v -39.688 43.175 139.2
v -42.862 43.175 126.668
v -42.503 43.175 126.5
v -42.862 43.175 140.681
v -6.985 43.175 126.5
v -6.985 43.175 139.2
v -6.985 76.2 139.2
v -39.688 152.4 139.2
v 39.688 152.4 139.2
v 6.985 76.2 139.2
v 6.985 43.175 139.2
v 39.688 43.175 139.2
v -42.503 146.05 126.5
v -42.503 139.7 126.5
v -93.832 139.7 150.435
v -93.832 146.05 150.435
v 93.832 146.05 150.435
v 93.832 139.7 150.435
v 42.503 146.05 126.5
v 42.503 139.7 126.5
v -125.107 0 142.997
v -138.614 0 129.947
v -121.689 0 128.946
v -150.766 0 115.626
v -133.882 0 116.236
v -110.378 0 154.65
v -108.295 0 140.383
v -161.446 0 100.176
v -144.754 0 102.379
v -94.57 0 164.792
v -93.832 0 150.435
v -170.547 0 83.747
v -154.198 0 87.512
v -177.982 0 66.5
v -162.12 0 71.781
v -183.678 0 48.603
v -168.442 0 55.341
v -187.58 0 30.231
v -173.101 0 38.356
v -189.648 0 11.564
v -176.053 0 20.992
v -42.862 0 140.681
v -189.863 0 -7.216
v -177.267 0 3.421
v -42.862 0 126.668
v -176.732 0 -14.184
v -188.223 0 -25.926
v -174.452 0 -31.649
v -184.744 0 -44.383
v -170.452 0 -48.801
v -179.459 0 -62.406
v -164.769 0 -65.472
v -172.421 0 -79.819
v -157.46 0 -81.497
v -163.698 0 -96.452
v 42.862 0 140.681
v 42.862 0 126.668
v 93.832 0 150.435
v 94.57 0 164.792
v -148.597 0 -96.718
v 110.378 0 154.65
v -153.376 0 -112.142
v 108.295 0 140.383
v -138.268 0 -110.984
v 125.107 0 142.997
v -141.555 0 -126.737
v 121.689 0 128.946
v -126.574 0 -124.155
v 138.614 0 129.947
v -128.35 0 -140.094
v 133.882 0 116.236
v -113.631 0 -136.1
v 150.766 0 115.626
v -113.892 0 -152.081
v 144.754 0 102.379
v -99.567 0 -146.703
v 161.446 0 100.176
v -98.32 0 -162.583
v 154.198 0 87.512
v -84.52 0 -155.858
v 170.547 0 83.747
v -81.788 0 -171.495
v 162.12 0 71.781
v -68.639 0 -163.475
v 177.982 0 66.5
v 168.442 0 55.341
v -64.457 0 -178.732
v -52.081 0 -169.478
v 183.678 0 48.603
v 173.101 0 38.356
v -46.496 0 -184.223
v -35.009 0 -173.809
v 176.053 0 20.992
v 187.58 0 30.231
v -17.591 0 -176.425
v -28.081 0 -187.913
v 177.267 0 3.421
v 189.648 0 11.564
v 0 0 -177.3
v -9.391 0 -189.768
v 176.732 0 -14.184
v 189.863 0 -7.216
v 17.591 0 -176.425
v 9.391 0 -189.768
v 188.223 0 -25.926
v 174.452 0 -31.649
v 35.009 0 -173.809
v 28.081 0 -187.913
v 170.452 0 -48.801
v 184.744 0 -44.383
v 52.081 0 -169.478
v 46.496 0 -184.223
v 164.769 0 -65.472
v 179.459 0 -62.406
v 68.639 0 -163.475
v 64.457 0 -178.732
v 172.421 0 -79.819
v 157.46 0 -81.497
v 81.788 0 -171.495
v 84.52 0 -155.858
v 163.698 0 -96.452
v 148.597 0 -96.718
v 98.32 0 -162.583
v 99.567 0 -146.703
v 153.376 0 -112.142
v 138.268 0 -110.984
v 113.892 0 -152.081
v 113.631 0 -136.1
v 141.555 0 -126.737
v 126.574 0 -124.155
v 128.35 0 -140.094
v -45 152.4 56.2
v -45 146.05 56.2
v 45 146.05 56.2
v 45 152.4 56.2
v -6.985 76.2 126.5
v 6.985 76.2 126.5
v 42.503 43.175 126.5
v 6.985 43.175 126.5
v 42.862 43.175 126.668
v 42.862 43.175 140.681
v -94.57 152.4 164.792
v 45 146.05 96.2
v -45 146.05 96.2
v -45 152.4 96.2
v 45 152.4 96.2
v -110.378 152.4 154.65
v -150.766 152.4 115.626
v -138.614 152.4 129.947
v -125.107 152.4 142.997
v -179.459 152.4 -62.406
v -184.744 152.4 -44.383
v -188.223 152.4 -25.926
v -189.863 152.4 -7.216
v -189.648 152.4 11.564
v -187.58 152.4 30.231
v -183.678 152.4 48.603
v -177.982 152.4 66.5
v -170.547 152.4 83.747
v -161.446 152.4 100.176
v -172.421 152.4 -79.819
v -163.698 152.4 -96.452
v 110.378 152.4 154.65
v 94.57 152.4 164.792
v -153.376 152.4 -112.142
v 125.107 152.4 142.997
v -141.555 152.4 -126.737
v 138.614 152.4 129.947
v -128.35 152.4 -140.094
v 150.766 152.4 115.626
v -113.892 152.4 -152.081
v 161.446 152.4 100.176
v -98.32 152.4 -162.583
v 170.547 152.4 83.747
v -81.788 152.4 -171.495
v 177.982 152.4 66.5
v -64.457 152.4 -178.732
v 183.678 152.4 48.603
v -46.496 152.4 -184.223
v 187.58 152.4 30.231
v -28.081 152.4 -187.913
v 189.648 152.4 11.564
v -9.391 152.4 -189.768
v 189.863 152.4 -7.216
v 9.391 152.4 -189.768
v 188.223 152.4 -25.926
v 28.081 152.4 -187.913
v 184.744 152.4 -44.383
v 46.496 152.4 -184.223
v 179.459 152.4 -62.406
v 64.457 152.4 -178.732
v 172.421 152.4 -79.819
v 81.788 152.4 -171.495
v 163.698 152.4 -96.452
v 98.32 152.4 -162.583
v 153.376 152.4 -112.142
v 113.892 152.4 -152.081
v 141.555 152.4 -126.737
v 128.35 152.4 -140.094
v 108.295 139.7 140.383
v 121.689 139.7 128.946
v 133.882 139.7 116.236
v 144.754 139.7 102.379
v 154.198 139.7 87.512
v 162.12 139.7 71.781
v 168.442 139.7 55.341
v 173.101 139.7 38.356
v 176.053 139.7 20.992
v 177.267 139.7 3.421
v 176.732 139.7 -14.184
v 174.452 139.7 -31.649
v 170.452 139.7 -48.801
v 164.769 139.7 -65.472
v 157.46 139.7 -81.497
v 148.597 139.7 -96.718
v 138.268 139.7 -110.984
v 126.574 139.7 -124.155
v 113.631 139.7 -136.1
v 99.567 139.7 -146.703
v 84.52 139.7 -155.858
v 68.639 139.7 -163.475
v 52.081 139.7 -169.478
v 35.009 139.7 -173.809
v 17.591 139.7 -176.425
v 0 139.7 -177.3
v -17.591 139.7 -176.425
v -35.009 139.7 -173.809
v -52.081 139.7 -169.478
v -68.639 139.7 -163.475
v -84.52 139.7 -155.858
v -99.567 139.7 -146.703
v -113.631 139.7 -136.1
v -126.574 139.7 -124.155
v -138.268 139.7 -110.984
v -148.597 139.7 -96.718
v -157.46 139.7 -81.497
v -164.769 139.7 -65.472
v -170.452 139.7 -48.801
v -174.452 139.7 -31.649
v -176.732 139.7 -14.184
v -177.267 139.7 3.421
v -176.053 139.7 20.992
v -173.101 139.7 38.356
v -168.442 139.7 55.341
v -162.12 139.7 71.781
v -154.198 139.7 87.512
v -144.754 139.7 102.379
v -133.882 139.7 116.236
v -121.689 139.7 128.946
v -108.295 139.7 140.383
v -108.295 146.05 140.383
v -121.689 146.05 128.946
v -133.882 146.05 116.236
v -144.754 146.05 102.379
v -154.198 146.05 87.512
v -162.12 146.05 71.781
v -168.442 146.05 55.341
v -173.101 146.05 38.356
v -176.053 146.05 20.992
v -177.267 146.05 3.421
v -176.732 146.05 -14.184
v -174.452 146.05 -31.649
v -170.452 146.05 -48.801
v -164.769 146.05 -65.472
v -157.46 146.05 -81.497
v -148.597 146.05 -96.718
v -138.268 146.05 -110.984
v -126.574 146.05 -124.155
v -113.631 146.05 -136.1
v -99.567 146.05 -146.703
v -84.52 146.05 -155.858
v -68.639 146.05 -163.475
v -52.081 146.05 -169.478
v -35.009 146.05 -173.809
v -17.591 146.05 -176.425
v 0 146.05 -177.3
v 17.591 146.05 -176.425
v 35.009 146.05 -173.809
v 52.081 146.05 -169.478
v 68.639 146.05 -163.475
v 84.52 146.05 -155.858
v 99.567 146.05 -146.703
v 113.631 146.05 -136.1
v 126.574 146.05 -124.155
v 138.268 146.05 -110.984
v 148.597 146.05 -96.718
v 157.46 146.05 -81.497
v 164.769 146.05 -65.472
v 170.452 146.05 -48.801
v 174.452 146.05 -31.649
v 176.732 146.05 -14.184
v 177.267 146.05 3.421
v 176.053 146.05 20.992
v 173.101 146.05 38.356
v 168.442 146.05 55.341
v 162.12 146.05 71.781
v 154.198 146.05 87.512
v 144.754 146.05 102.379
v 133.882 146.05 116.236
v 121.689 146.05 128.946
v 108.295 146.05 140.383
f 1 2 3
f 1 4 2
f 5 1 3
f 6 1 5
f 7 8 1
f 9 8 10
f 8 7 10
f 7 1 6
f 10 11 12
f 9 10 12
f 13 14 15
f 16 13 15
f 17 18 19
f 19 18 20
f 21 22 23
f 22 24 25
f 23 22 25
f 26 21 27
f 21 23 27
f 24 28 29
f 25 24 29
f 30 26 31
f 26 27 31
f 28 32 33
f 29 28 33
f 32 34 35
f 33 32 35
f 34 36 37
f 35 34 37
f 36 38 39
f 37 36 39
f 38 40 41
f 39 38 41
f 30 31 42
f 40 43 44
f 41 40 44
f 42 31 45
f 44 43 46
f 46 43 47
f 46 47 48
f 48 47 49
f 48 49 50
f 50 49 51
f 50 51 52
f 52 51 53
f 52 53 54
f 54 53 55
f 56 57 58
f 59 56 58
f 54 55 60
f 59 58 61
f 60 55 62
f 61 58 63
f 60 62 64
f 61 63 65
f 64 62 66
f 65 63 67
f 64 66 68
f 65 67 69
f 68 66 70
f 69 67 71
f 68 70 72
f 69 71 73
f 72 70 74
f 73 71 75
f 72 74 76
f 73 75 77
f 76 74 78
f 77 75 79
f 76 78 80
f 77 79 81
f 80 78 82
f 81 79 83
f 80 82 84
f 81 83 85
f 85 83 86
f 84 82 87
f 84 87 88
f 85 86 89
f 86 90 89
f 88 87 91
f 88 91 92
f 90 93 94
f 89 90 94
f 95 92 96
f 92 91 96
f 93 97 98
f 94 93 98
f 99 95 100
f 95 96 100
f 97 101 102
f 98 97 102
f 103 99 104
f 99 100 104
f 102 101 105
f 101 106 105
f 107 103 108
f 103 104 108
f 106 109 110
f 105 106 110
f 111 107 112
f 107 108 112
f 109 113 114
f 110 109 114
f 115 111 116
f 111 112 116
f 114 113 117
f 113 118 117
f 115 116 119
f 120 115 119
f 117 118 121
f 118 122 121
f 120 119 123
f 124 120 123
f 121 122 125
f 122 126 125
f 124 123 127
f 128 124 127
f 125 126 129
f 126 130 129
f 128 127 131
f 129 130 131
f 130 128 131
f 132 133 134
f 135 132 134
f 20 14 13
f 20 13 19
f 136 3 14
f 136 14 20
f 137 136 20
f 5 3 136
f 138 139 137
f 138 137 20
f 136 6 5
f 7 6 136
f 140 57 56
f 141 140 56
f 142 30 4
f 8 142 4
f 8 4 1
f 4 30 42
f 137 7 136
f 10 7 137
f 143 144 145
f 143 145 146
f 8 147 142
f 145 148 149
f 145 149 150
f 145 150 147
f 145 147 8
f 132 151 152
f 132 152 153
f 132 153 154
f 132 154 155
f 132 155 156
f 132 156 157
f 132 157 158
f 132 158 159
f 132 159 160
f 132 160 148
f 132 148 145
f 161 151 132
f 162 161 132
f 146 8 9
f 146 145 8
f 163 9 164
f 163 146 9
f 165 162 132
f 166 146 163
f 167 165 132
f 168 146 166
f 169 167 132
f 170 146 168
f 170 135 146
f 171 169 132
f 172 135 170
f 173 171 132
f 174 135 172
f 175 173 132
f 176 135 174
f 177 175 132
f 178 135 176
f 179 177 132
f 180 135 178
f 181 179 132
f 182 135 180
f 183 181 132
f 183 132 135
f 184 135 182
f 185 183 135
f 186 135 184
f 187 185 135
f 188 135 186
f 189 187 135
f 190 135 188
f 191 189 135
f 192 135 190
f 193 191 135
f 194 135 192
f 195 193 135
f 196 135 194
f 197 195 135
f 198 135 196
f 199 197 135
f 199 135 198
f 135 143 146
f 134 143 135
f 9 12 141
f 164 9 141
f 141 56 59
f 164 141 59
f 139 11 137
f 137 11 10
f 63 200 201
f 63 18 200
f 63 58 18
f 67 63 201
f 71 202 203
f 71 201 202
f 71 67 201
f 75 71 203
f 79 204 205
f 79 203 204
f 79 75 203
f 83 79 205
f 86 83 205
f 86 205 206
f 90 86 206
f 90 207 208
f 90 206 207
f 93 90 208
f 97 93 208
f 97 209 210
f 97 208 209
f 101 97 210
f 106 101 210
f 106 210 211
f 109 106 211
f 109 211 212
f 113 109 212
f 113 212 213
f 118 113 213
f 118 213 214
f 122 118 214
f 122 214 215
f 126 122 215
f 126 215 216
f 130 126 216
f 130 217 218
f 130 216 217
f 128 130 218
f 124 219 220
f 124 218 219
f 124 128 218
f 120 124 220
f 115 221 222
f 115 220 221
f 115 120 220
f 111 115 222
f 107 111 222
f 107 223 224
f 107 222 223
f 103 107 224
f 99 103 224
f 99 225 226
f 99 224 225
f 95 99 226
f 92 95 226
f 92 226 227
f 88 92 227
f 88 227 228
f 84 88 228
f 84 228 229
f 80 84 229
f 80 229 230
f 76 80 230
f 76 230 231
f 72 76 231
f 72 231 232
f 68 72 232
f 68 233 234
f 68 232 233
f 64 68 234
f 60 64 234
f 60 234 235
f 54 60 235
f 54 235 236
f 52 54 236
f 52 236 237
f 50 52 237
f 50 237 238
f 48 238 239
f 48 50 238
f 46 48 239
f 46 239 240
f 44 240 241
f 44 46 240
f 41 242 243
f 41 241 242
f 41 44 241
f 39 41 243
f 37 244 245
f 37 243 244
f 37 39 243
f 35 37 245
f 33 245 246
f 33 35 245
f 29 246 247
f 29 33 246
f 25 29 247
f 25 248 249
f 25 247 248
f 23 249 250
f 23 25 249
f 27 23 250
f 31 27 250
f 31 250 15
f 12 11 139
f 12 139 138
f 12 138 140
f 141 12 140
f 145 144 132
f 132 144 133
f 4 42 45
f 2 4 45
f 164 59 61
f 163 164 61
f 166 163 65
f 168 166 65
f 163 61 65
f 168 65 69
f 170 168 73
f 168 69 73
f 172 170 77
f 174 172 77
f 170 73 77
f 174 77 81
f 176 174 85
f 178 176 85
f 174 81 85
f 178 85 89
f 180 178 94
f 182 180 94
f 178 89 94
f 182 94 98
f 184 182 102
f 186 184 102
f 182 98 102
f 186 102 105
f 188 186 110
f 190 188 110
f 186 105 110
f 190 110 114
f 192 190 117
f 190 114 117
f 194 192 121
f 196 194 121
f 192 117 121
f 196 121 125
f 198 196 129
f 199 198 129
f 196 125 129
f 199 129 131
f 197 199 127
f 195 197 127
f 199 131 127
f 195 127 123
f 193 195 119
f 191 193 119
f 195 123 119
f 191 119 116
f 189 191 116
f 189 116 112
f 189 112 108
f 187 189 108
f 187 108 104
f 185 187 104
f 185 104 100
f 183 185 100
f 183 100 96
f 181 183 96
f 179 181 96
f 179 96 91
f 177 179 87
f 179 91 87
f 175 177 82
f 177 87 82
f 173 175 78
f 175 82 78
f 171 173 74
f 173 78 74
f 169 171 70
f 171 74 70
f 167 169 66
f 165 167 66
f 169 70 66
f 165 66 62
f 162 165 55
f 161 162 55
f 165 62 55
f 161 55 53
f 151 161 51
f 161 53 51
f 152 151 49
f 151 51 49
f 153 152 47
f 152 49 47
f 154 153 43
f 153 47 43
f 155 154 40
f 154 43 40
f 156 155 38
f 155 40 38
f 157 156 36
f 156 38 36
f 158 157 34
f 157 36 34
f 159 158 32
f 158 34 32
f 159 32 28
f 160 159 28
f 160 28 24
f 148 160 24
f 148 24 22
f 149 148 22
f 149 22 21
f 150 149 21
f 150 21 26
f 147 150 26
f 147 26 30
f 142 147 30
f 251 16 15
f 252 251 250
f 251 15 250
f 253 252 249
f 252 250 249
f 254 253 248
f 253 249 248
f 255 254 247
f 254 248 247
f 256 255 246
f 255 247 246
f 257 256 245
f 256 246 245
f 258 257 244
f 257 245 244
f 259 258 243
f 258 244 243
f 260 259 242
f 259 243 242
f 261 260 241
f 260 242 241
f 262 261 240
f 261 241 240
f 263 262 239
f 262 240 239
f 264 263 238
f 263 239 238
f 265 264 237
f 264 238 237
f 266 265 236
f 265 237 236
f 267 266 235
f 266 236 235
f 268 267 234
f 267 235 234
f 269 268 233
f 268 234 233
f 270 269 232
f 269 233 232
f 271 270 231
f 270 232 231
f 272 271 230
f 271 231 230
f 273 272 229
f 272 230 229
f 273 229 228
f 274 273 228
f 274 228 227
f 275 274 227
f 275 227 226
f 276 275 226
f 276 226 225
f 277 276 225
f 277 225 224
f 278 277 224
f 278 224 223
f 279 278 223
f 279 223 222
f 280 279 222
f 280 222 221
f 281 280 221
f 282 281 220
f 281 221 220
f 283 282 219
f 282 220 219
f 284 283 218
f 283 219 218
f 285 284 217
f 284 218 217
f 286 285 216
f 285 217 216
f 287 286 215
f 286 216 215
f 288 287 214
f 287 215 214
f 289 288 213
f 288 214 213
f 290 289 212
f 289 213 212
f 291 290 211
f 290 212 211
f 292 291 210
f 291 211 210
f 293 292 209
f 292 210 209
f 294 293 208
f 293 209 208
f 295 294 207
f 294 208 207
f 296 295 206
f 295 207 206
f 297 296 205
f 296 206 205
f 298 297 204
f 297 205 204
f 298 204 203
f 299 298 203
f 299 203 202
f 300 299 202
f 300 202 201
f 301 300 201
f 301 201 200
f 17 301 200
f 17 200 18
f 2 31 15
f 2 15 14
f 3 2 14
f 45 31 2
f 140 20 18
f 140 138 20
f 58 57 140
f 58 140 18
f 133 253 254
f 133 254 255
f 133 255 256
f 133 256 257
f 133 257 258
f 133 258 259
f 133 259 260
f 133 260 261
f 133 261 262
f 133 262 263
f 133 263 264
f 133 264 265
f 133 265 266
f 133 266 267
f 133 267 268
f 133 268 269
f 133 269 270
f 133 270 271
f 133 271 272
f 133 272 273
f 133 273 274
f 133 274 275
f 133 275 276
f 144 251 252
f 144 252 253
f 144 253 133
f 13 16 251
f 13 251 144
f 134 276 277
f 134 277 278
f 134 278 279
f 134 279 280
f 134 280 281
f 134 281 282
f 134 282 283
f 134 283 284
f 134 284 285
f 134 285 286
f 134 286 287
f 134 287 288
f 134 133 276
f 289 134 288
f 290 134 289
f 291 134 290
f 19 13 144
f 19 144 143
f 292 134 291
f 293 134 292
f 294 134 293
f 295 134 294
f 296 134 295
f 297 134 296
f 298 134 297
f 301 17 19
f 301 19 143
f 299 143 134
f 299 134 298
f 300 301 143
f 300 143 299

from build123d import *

# Parameters (mm, degrees)
BOSS_EXTRUDE1_DEPTH     = 152.4
SHELL2_T                = -12.7
CUT_EXTRUDE1_DEPTH      = 43.175
CUT_EXTRUDE2_DEPTH      = 309.910601955
CUT_EXTRUDE2_DEPTH_BACK = 309.910601955
SKETCH3_W               = 90
SKETCH3_H               = 40
SKETCH4_W               = 13.97
SKETCH4_H               = 33.025
CUT_EXTRUDE3_DEPTH      = 12.7
SKETCH5_W               = 90
SKETCH5_H               = 40
CUT_EXTRUDE4_DEPTH      = 6.35


with BuildPart() as part:
    # Sketch1 → Boss-Extrude1 (new body)
    with BuildSketch(Plane(origin=(0, 0, 0), x_dir=(1, 0, 0), z_dir=(0, 1, 0))):
        with BuildLine():
            Line((-39.6875, -139.2), (39.6875, -139.2))
            Line((39.6875, -139.2), (94.570201191, -164.792223866))
            ThreePointArc((94.570201191, -164.792223866), (0, 190), (-94.570201191, -164.792223866))
            Line((-94.570201191, -164.792223866), (-39.6875, -139.2))
        make_face()
    extrude(amount=BOSS_EXTRUDE1_DEPTH)

    # Shell2
    shell2_openings = [part.faces().sort_by_distance(p)[0] for p in [
        (0, 0, -10.230254614),
    ]]
    offset(amount=SHELL2_T, openings=shell2_openings, kind=Kind.INTERSECTION)

    # Sketch2 → Cut-Extrude1 (cut)
    with BuildSketch(Plane.XZ):
        Polygon((-42.503022216, 126.5), (42.503022216, 126.5), (42.8625, 126.667627244), (42.8625, 140.680526815), (39.6875, 139.2), (-39.6875, 139.2), (-42.8625, 140.680526815), (-42.8625, 126.667627244), align=None)
    extrude(amount=-CUT_EXTRUDE1_DEPTH, mode=Mode.SUBTRACT)

    # Sketch3 → Cut-Extrude2 (cut, two sides: drawn at the far end of the back side and taken through both)
    with BuildSketch(Plane(origin=(0, 152.4, 0), x_dir=(1, 0, 0), z_dir=(0, 1, 0)).offset(-CUT_EXTRUDE2_DEPTH_BACK)):
        with Locations((0, -76.2)):
            Rectangle(SKETCH3_W, SKETCH3_H)
    extrude(amount=CUT_EXTRUDE2_DEPTH + CUT_EXTRUDE2_DEPTH_BACK, mode=Mode.SUBTRACT)

    # Sketch4 → Cut-Extrude3 (cut)
    with BuildSketch(Plane.XY.offset(139.2)):
        with Locations((0, 59.6875)):
            Rectangle(SKETCH4_W, SKETCH4_H)
    extrude(amount=-CUT_EXTRUDE3_DEPTH, mode=Mode.SUBTRACT)

    # Sketch5 → Cut-Extrude4 (cut)
    with BuildSketch(Plane.XZ.offset(-139.7)):
        with BuildLine():
            Line((42.503022216, 126.5), (-42.503022216, 126.5))
            Line((-42.503022216, 126.5), (-93.832389801, 150.435277193))
            ThreePointArc((-93.832389801, 150.435277193), (0, -177.3), (93.832389801, 150.435277193))
            Line((93.832389801, 150.435277193), (42.503022216, 126.5))
        make_face()
        with Locations((0, 76.2)):
            Rectangle(SKETCH5_W, SKETCH5_H, mode=Mode.SUBTRACT)
    extrude(amount=-CUT_EXTRUDE4_DEPTH, mode=Mode.SUBTRACT)


solid = part.part
